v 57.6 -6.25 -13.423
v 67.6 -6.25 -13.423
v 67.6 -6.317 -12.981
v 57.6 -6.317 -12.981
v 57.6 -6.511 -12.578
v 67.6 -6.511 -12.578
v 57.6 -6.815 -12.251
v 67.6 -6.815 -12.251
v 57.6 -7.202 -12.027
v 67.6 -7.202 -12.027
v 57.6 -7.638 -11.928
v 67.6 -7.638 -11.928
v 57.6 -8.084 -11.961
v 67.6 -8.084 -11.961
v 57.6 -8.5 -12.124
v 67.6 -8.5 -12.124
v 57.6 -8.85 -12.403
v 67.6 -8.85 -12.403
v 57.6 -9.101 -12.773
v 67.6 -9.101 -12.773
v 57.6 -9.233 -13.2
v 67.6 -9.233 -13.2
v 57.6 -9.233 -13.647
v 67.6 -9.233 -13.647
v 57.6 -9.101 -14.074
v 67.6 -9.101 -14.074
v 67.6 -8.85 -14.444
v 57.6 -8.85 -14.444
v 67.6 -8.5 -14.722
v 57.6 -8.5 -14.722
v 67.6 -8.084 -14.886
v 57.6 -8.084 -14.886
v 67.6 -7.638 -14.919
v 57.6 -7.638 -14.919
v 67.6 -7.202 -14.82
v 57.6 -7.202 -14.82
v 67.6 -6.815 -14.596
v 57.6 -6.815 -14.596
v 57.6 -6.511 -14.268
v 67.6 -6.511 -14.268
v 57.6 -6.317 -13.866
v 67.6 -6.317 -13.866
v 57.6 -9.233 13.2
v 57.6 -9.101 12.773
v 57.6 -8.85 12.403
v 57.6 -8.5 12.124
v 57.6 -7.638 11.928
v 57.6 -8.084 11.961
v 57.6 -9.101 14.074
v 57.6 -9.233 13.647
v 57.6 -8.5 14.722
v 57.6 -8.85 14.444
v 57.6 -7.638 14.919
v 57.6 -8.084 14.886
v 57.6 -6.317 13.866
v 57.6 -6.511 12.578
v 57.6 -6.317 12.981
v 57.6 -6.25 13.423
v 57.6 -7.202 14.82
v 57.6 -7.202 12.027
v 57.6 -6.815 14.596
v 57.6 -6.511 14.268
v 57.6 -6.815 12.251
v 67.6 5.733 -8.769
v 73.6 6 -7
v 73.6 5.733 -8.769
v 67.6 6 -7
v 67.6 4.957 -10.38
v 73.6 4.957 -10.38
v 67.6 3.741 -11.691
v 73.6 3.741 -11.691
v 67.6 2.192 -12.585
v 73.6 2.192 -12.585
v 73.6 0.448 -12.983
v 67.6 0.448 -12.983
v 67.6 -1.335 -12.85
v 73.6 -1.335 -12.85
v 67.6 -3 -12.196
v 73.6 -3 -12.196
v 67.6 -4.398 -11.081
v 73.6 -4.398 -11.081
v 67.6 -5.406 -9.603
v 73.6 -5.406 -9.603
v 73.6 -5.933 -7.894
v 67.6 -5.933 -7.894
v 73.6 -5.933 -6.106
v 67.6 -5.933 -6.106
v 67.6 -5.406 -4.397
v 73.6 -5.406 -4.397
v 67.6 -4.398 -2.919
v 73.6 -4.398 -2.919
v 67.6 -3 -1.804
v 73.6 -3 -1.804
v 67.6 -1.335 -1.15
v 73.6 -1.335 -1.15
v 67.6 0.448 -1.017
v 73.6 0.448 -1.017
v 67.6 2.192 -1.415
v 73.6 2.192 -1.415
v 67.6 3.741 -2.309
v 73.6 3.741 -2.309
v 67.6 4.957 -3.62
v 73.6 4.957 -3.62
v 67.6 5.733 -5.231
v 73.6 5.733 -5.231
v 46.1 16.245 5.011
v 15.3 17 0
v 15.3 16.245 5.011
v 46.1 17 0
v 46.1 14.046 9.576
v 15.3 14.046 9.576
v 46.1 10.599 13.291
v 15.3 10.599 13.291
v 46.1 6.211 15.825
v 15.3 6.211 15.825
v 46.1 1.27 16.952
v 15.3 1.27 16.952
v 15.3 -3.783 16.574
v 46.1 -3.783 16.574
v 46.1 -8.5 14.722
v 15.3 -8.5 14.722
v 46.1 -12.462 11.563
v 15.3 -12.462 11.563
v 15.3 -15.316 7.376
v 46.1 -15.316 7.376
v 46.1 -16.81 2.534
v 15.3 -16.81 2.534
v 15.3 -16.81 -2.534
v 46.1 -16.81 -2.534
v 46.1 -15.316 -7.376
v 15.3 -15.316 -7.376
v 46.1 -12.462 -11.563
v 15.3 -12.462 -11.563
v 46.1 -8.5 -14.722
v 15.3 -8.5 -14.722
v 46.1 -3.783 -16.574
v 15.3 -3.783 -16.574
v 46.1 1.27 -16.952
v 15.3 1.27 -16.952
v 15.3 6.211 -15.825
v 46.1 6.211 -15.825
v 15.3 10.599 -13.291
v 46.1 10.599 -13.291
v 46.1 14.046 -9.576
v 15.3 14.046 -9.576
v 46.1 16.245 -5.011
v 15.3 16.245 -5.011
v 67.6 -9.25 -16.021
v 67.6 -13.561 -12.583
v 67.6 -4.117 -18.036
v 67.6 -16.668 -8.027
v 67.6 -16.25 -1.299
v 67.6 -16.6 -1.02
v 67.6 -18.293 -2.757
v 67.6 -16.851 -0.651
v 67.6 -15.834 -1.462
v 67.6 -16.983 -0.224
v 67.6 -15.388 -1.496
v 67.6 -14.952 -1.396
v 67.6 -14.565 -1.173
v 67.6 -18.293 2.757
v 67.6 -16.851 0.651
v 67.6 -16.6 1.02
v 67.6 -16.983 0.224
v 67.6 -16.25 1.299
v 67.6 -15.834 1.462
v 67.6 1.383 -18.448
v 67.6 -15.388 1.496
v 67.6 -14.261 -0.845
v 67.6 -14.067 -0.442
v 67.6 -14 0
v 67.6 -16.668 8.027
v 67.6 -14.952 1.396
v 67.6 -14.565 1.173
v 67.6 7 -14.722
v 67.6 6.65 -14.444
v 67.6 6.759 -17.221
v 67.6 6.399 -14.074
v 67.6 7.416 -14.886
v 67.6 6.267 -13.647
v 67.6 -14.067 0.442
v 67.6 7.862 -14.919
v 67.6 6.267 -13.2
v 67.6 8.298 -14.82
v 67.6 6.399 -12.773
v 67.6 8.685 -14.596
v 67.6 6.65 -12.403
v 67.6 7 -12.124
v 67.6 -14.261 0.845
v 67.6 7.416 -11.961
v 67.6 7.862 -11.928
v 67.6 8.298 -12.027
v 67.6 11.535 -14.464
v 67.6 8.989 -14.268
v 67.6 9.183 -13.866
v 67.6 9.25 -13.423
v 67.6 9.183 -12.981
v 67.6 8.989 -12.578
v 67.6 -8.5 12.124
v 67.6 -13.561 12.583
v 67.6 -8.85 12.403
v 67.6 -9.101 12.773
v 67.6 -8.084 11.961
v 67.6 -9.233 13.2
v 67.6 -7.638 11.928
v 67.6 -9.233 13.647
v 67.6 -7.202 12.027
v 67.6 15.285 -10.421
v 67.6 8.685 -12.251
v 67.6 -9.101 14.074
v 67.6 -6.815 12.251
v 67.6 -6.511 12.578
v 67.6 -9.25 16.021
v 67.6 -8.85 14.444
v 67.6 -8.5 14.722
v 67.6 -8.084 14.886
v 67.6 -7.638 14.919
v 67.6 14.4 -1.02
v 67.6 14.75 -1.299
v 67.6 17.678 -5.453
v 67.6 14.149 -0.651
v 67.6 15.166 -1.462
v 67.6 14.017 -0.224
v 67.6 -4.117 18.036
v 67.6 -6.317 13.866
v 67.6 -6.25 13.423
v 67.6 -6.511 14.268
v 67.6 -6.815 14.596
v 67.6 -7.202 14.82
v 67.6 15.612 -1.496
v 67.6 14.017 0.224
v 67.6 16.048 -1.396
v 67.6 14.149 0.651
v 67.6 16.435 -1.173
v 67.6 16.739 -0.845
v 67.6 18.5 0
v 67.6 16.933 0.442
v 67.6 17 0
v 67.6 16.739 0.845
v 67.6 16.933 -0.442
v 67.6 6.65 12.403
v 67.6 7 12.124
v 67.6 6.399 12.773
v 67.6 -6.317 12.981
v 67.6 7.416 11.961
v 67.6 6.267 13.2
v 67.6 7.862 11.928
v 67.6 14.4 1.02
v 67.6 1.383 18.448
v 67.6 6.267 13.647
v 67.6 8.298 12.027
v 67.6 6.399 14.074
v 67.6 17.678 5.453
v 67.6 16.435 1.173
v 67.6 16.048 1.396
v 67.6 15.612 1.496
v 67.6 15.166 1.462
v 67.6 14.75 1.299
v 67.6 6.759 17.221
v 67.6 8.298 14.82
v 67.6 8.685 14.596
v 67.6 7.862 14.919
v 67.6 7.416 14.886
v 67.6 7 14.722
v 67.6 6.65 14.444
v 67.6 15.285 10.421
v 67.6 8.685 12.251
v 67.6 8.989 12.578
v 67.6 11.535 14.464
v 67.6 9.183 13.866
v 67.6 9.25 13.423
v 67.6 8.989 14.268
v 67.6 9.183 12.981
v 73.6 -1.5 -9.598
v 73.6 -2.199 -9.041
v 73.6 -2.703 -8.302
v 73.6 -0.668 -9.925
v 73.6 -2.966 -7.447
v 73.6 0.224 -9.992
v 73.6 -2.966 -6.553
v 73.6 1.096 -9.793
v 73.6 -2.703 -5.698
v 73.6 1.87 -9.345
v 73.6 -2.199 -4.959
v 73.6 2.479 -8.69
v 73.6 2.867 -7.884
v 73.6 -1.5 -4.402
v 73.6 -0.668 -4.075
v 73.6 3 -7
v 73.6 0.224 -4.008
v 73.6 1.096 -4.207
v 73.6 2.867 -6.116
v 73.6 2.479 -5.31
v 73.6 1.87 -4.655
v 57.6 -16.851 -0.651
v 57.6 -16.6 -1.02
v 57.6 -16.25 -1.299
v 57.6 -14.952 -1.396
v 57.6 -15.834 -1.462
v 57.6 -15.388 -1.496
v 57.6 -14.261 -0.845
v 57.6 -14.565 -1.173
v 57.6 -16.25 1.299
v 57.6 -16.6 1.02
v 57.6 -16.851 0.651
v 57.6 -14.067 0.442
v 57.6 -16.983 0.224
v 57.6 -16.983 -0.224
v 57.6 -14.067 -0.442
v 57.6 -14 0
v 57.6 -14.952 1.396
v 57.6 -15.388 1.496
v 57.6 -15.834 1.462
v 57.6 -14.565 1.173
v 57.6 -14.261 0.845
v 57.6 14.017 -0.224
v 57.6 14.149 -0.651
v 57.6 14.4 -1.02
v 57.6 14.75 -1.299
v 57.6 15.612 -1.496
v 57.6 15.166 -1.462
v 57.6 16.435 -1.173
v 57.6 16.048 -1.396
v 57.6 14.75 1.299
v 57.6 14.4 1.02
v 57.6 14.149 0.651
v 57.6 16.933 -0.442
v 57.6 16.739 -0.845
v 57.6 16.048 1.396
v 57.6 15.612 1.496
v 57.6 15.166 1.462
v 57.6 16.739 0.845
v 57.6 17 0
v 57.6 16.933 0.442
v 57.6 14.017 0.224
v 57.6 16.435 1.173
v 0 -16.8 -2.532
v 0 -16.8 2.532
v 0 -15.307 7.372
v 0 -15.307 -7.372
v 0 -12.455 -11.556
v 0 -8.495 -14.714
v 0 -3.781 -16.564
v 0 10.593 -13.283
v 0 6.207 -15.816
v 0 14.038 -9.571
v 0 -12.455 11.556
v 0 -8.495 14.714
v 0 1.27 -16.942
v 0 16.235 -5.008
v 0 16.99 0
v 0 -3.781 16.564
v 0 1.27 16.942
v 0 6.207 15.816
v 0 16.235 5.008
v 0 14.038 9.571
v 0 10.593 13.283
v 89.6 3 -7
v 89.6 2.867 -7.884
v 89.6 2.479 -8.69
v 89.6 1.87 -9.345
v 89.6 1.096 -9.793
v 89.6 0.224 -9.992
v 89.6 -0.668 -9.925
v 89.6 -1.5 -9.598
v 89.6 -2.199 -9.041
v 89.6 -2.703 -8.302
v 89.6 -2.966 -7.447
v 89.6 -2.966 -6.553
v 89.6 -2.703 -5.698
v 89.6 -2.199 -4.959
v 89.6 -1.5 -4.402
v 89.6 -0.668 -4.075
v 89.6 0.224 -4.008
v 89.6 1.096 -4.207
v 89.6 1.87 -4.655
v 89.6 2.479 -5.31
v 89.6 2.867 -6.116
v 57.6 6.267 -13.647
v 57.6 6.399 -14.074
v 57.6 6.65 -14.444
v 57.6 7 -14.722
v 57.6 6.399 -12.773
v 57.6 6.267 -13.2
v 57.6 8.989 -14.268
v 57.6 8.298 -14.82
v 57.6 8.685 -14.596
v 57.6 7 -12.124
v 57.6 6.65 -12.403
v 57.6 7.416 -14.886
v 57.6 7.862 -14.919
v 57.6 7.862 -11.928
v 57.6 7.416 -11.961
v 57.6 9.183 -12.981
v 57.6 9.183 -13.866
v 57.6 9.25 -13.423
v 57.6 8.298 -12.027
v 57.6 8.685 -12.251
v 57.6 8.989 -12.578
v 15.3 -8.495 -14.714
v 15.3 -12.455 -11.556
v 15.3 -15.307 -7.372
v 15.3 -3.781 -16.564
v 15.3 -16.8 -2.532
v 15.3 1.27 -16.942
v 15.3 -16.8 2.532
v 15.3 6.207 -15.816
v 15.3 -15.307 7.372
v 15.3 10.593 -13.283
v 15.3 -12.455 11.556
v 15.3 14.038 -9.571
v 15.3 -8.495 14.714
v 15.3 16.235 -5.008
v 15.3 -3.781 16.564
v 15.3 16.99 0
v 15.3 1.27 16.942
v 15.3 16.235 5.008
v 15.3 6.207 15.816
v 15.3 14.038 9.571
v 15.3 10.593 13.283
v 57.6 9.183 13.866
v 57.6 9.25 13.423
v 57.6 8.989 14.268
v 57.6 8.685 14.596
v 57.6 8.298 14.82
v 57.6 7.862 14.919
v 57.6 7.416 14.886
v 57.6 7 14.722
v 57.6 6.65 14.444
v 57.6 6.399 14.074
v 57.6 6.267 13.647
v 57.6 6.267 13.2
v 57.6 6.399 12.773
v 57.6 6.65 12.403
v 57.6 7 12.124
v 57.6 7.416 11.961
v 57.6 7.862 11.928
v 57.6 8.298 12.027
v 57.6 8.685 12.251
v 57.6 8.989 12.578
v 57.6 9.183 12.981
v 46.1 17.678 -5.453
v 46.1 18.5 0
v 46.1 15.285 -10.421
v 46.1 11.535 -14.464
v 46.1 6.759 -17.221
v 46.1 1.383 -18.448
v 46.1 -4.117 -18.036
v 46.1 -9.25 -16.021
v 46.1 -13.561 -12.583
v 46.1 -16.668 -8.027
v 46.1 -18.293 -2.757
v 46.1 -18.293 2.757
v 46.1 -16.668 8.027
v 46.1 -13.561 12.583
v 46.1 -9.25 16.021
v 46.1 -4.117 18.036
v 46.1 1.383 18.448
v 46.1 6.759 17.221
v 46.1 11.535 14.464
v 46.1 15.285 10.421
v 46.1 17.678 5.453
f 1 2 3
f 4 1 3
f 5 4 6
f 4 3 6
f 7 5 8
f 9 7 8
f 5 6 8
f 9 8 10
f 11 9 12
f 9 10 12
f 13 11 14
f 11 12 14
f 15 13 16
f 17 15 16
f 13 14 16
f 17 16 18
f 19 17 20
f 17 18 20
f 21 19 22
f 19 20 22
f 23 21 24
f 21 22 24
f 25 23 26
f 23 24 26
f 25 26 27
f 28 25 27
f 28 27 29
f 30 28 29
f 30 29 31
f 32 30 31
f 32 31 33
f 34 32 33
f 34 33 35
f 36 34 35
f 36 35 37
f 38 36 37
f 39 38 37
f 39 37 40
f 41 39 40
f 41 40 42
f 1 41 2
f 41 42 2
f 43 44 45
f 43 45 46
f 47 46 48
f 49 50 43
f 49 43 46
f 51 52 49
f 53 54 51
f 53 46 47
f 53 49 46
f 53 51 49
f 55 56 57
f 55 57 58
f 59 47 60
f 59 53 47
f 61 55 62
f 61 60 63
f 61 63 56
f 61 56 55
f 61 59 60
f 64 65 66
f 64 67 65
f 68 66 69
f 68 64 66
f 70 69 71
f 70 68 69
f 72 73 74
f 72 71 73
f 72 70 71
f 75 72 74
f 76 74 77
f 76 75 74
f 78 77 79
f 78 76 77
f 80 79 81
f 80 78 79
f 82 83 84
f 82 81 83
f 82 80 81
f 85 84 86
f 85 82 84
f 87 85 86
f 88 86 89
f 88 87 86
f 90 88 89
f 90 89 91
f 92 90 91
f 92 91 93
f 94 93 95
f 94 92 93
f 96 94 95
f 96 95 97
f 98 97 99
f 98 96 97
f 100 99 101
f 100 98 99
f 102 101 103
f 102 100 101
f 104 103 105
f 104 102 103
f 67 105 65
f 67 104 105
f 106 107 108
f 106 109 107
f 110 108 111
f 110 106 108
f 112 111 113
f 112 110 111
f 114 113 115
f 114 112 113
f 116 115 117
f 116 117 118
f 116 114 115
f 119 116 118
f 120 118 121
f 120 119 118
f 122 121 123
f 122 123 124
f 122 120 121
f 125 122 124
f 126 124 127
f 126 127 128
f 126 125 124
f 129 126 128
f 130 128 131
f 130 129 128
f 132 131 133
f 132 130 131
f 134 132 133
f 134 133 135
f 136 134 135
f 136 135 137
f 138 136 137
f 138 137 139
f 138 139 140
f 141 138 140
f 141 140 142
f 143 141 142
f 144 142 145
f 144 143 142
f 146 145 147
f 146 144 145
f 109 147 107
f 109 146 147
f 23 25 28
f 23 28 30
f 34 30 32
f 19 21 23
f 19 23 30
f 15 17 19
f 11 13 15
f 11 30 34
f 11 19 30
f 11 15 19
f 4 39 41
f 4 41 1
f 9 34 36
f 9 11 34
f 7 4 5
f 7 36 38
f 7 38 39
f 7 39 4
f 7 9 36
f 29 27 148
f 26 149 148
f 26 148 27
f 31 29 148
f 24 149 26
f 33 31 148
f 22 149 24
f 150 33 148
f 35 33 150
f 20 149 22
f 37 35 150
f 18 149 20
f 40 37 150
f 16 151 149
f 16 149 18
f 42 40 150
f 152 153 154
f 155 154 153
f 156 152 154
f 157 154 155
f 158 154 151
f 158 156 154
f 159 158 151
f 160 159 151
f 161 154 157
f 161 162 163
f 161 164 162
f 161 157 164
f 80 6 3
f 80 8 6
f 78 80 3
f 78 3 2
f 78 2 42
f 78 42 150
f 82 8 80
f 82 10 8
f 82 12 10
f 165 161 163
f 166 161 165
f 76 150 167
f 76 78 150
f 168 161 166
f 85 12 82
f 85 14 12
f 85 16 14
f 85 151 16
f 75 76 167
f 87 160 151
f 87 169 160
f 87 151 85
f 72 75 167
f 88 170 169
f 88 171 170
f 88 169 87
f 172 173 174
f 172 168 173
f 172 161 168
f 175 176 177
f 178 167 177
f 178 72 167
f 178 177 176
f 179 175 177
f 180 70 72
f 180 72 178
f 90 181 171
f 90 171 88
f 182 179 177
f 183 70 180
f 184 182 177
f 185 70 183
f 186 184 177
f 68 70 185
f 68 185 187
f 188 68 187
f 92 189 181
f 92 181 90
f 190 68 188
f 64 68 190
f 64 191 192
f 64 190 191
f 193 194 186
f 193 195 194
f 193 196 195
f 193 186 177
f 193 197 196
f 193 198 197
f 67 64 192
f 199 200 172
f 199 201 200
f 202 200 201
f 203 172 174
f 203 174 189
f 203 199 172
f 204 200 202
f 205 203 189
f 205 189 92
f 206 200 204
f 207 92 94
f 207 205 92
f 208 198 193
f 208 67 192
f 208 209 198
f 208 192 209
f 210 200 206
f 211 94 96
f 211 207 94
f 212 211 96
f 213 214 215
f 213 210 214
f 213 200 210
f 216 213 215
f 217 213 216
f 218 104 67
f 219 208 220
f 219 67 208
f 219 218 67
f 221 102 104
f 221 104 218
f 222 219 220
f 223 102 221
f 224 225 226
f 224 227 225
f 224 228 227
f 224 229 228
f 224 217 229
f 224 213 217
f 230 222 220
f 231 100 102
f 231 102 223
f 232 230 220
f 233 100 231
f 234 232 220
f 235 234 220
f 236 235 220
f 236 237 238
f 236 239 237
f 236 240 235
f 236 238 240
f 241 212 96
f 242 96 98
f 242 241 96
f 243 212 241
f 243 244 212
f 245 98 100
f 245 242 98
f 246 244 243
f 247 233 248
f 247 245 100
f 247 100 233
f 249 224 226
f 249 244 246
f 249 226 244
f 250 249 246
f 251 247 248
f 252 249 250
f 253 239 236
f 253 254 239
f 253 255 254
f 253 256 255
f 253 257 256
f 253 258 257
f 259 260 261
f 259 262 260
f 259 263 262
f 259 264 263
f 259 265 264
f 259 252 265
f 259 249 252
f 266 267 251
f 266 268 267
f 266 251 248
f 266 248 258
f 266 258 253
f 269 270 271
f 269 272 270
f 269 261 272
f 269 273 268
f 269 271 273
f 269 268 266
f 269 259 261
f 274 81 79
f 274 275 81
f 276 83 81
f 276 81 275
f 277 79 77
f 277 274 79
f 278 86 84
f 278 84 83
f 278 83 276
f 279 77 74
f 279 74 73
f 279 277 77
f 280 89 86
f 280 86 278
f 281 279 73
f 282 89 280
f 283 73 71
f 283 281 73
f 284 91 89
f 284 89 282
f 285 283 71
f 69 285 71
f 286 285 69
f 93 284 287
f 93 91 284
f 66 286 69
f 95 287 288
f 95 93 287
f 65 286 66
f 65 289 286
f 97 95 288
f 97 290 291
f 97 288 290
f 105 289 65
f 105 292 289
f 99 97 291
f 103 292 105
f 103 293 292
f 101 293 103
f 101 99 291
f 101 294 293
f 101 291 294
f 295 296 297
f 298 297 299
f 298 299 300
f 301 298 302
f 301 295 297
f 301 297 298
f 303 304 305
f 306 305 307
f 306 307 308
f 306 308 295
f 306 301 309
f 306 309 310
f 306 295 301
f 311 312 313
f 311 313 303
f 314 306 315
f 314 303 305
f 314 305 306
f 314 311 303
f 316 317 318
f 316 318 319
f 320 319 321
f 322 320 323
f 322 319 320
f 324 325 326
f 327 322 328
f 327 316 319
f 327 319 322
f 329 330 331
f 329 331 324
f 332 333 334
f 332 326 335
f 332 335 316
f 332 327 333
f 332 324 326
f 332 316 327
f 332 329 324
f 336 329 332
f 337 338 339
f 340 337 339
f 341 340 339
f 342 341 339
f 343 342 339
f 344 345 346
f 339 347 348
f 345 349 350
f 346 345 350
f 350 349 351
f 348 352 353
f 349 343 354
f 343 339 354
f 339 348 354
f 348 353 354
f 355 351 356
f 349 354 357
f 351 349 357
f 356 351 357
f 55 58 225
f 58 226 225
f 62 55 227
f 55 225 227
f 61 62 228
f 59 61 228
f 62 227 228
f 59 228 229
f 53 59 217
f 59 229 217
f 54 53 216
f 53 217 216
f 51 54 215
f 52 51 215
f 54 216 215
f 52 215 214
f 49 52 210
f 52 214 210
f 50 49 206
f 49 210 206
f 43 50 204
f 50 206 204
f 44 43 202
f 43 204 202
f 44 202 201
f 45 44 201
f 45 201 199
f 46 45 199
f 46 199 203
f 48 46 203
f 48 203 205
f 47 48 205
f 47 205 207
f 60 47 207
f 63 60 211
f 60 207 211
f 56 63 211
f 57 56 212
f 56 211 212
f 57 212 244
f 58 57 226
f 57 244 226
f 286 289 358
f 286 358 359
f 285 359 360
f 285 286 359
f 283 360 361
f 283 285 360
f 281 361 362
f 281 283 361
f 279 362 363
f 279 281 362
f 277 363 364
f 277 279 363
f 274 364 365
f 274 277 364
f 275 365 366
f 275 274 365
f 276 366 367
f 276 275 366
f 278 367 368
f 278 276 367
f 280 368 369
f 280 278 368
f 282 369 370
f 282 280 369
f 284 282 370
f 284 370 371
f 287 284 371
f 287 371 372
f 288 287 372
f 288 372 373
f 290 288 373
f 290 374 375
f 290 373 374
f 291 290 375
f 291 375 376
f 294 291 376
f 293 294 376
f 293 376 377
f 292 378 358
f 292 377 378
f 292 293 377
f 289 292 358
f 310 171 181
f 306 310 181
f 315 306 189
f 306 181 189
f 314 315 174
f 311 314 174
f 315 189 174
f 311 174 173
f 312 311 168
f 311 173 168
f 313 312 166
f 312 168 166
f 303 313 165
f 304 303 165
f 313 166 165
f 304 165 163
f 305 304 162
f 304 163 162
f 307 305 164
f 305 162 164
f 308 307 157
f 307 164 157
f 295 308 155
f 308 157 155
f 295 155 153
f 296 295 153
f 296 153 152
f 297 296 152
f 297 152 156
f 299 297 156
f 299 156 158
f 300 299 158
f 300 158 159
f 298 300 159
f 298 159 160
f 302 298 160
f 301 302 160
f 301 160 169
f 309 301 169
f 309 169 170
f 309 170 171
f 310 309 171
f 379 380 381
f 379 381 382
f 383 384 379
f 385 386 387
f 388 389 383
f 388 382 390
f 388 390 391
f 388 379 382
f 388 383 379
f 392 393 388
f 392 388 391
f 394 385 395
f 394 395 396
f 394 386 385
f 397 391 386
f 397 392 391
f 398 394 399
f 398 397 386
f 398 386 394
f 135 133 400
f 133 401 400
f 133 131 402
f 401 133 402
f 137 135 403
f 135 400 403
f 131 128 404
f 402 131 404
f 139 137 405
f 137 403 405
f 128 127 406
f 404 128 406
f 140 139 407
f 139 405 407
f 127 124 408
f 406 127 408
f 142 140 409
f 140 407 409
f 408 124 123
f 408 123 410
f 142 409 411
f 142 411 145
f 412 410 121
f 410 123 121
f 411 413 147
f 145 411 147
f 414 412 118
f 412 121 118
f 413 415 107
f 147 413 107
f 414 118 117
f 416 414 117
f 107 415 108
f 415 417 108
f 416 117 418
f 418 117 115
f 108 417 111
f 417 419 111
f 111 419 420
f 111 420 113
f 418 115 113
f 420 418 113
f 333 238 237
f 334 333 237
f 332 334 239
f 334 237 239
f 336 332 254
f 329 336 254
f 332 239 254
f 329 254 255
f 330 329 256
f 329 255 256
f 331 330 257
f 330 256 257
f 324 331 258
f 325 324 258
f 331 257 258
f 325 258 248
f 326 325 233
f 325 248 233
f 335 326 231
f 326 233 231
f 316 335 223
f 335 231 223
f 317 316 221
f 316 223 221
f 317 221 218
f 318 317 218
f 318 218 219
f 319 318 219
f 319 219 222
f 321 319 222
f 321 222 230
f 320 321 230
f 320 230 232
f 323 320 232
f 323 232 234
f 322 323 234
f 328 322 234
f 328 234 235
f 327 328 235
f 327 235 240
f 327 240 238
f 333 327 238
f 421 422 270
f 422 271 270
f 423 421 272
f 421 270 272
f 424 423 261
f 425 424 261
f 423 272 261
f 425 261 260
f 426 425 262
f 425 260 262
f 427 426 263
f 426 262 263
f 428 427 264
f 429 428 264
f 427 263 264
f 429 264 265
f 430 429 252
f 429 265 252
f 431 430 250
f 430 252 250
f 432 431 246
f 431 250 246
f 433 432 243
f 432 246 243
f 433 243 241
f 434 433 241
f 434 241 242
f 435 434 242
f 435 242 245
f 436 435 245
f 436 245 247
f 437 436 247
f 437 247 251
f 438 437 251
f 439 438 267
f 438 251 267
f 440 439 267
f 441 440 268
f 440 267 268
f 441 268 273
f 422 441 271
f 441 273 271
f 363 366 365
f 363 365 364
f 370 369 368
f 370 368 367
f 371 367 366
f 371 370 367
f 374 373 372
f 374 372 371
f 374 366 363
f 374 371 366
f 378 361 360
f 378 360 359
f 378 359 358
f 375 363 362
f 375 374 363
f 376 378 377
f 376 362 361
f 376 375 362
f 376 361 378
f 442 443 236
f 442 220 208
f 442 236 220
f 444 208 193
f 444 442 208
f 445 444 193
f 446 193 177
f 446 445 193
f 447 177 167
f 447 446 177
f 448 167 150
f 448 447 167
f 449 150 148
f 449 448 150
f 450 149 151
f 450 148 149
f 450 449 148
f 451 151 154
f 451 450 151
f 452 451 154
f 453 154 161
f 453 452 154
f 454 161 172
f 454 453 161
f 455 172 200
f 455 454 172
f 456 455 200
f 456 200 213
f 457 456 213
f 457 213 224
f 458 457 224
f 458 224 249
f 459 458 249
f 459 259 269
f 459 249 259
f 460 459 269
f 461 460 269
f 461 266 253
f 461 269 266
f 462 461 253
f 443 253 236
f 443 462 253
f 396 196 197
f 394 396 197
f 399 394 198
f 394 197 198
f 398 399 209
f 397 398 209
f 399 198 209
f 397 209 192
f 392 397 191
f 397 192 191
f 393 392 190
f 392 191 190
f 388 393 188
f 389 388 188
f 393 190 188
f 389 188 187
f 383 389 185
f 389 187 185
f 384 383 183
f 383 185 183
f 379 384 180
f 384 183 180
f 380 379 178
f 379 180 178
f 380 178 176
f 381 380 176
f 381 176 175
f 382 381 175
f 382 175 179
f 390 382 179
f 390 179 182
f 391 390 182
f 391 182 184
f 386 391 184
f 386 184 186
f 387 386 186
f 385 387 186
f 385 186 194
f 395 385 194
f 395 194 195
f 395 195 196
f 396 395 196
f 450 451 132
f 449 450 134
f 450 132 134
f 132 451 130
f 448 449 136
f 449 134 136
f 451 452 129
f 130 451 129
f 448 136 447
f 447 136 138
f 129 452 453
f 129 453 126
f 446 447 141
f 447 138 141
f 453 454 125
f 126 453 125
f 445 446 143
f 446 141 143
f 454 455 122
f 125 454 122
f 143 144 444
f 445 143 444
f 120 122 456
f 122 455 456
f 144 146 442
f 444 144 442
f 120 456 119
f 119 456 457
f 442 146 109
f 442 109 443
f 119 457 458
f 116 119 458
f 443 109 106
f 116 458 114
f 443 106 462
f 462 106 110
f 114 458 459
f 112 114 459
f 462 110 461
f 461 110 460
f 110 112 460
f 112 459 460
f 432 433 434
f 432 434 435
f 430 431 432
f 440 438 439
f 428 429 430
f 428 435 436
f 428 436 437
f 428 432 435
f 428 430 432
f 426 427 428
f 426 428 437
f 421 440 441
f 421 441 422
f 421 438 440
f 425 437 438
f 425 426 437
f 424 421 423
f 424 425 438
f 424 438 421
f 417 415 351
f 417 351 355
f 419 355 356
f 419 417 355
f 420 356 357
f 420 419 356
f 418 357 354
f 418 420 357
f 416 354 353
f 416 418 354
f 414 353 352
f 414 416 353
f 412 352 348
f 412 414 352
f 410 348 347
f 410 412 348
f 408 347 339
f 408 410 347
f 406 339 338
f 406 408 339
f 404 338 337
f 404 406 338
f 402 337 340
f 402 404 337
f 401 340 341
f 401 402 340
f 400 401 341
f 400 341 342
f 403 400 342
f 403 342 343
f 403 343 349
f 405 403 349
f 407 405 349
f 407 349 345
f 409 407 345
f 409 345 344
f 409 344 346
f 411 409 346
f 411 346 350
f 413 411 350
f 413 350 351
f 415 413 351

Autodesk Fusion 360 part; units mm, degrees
sketch "Esquisse1" plane through (0, 0, 0) normal (0, 0, 1) x (1, 0, 0) in component "Motor"
  line L0 (0, 0) -> (0, 16.99)
  line L1 (0, 16.99) -> (15.3, 16.99)
  line L2 (15.3, 16.99) -> (15.3, 0)
  line L3 (46.1, 17) -> (46.1, 0)
  line L4 (46.1, 0) -> (67.6, 0) construction
  line L5 (67.6, 0) -> (67.6, 18.5)
  line L6 (67.6, 18.5) -> (46.1, 18.5)
  line L7 (46.1, 18.5) -> (46.1, 17)
  line L8 (0, 0) -> (67.6, 0)
  line L9 (15.3, 16.99) -> (15.3, 17)
  line L10 (15.3, 17) -> (46.1, 17)
  dimension "d2" = 16.99
  dimension "d7" = 15.3
  dimension "d8" = 30.8
  dimension "d10" = 21.5
  dimension "d11" = 18.5
  dimension "d12" = 21.5
  dimension "d13" = 0.01
revolve "Révolution1" add sketch "Esquisse1" angle 360 about axis through (0, 0, 0) along (1, 0, 0) makes body 1 in component "Motor"
sketch "Esquisse2" plane through (67.6, 0, 0) normal (1, 0, 0) x (0, 1, 0) in component "Motor"
  circle A0 centre (0, 0) radius 18.5
  line L0 (0, 0) -> (18.5, 0) construction
  line L1 (0, 0) -> (-15.5, 0) construction
  circle A1 centre (-15.5, 0) radius 1.5
  circle A2 centre (0, 0) radius 15.5 construction
  line L2 (-15.5, 0) -> (-7.75, -13.4234) construction
  circle A3 centre (-7.75, -13.4234) radius 1.5
  circle A4 centre (-7.75, 13.4234) radius 1.5
  line L3 (0, 0) -> (0, -18.5) construction
  circle A5 centre (7.75, 13.4234) radius 1.5
  circle A6 centre (15.5, 0) radius 1.5
  circle A7 centre (7.75, -13.4234) radius 1.5
  line L4 (0, 0) -> (0, -7) construction
  circle A8 centre (0, -7) radius 6
  circle A9 centre (0, -7) radius 3
  dimension "d14" = 15.5
  dimension "d15" = 3
  dimension "d16" = 15.5
  dimension "d17" = 3
  dimension "d18" = 7
  dimension "d19" = 12
  dimension "d20" = 6
  dimension "d27" = 3
  dimension "d28" = 3
  dimension "d29" = 3
  dimension "d30" = 3
extrude "Extrusion3" cut sketch "Esquisse2" against normal blind 10 contours A1 | A3 | A4 | A5 | A6 | A7 bodies 1 in component "Motor"
extrude "Extrusion1" add sketch "Esquisse2" along normal blind 6 contours A8 bodies 1 in component "Motor"
extrude "Extrusion2" add 1 faces at (67.6, -1.8565, -7.7286) along direction (1, 0, 0) blind 22 on bodies 1 bodies 1 in component "Motor"
copy_body "CutPasteBodies1" bodies 1 removing the originals makes body 2 in component "Motor"
component "Motor" placed x (1, 0, 0) y (0, 1, 0) z (0, 0, 1) at (0, 0, 0)
equation "d2 = ( ( 34 / 2 ) * 1 ) * 1 mm - 0.01 mm"
equation "d11 = ( 37 / 2 ) * 1 mm"
equation "d14 = ( 31 / 2 ) * 1 mm"
equation "d17 = d15"
